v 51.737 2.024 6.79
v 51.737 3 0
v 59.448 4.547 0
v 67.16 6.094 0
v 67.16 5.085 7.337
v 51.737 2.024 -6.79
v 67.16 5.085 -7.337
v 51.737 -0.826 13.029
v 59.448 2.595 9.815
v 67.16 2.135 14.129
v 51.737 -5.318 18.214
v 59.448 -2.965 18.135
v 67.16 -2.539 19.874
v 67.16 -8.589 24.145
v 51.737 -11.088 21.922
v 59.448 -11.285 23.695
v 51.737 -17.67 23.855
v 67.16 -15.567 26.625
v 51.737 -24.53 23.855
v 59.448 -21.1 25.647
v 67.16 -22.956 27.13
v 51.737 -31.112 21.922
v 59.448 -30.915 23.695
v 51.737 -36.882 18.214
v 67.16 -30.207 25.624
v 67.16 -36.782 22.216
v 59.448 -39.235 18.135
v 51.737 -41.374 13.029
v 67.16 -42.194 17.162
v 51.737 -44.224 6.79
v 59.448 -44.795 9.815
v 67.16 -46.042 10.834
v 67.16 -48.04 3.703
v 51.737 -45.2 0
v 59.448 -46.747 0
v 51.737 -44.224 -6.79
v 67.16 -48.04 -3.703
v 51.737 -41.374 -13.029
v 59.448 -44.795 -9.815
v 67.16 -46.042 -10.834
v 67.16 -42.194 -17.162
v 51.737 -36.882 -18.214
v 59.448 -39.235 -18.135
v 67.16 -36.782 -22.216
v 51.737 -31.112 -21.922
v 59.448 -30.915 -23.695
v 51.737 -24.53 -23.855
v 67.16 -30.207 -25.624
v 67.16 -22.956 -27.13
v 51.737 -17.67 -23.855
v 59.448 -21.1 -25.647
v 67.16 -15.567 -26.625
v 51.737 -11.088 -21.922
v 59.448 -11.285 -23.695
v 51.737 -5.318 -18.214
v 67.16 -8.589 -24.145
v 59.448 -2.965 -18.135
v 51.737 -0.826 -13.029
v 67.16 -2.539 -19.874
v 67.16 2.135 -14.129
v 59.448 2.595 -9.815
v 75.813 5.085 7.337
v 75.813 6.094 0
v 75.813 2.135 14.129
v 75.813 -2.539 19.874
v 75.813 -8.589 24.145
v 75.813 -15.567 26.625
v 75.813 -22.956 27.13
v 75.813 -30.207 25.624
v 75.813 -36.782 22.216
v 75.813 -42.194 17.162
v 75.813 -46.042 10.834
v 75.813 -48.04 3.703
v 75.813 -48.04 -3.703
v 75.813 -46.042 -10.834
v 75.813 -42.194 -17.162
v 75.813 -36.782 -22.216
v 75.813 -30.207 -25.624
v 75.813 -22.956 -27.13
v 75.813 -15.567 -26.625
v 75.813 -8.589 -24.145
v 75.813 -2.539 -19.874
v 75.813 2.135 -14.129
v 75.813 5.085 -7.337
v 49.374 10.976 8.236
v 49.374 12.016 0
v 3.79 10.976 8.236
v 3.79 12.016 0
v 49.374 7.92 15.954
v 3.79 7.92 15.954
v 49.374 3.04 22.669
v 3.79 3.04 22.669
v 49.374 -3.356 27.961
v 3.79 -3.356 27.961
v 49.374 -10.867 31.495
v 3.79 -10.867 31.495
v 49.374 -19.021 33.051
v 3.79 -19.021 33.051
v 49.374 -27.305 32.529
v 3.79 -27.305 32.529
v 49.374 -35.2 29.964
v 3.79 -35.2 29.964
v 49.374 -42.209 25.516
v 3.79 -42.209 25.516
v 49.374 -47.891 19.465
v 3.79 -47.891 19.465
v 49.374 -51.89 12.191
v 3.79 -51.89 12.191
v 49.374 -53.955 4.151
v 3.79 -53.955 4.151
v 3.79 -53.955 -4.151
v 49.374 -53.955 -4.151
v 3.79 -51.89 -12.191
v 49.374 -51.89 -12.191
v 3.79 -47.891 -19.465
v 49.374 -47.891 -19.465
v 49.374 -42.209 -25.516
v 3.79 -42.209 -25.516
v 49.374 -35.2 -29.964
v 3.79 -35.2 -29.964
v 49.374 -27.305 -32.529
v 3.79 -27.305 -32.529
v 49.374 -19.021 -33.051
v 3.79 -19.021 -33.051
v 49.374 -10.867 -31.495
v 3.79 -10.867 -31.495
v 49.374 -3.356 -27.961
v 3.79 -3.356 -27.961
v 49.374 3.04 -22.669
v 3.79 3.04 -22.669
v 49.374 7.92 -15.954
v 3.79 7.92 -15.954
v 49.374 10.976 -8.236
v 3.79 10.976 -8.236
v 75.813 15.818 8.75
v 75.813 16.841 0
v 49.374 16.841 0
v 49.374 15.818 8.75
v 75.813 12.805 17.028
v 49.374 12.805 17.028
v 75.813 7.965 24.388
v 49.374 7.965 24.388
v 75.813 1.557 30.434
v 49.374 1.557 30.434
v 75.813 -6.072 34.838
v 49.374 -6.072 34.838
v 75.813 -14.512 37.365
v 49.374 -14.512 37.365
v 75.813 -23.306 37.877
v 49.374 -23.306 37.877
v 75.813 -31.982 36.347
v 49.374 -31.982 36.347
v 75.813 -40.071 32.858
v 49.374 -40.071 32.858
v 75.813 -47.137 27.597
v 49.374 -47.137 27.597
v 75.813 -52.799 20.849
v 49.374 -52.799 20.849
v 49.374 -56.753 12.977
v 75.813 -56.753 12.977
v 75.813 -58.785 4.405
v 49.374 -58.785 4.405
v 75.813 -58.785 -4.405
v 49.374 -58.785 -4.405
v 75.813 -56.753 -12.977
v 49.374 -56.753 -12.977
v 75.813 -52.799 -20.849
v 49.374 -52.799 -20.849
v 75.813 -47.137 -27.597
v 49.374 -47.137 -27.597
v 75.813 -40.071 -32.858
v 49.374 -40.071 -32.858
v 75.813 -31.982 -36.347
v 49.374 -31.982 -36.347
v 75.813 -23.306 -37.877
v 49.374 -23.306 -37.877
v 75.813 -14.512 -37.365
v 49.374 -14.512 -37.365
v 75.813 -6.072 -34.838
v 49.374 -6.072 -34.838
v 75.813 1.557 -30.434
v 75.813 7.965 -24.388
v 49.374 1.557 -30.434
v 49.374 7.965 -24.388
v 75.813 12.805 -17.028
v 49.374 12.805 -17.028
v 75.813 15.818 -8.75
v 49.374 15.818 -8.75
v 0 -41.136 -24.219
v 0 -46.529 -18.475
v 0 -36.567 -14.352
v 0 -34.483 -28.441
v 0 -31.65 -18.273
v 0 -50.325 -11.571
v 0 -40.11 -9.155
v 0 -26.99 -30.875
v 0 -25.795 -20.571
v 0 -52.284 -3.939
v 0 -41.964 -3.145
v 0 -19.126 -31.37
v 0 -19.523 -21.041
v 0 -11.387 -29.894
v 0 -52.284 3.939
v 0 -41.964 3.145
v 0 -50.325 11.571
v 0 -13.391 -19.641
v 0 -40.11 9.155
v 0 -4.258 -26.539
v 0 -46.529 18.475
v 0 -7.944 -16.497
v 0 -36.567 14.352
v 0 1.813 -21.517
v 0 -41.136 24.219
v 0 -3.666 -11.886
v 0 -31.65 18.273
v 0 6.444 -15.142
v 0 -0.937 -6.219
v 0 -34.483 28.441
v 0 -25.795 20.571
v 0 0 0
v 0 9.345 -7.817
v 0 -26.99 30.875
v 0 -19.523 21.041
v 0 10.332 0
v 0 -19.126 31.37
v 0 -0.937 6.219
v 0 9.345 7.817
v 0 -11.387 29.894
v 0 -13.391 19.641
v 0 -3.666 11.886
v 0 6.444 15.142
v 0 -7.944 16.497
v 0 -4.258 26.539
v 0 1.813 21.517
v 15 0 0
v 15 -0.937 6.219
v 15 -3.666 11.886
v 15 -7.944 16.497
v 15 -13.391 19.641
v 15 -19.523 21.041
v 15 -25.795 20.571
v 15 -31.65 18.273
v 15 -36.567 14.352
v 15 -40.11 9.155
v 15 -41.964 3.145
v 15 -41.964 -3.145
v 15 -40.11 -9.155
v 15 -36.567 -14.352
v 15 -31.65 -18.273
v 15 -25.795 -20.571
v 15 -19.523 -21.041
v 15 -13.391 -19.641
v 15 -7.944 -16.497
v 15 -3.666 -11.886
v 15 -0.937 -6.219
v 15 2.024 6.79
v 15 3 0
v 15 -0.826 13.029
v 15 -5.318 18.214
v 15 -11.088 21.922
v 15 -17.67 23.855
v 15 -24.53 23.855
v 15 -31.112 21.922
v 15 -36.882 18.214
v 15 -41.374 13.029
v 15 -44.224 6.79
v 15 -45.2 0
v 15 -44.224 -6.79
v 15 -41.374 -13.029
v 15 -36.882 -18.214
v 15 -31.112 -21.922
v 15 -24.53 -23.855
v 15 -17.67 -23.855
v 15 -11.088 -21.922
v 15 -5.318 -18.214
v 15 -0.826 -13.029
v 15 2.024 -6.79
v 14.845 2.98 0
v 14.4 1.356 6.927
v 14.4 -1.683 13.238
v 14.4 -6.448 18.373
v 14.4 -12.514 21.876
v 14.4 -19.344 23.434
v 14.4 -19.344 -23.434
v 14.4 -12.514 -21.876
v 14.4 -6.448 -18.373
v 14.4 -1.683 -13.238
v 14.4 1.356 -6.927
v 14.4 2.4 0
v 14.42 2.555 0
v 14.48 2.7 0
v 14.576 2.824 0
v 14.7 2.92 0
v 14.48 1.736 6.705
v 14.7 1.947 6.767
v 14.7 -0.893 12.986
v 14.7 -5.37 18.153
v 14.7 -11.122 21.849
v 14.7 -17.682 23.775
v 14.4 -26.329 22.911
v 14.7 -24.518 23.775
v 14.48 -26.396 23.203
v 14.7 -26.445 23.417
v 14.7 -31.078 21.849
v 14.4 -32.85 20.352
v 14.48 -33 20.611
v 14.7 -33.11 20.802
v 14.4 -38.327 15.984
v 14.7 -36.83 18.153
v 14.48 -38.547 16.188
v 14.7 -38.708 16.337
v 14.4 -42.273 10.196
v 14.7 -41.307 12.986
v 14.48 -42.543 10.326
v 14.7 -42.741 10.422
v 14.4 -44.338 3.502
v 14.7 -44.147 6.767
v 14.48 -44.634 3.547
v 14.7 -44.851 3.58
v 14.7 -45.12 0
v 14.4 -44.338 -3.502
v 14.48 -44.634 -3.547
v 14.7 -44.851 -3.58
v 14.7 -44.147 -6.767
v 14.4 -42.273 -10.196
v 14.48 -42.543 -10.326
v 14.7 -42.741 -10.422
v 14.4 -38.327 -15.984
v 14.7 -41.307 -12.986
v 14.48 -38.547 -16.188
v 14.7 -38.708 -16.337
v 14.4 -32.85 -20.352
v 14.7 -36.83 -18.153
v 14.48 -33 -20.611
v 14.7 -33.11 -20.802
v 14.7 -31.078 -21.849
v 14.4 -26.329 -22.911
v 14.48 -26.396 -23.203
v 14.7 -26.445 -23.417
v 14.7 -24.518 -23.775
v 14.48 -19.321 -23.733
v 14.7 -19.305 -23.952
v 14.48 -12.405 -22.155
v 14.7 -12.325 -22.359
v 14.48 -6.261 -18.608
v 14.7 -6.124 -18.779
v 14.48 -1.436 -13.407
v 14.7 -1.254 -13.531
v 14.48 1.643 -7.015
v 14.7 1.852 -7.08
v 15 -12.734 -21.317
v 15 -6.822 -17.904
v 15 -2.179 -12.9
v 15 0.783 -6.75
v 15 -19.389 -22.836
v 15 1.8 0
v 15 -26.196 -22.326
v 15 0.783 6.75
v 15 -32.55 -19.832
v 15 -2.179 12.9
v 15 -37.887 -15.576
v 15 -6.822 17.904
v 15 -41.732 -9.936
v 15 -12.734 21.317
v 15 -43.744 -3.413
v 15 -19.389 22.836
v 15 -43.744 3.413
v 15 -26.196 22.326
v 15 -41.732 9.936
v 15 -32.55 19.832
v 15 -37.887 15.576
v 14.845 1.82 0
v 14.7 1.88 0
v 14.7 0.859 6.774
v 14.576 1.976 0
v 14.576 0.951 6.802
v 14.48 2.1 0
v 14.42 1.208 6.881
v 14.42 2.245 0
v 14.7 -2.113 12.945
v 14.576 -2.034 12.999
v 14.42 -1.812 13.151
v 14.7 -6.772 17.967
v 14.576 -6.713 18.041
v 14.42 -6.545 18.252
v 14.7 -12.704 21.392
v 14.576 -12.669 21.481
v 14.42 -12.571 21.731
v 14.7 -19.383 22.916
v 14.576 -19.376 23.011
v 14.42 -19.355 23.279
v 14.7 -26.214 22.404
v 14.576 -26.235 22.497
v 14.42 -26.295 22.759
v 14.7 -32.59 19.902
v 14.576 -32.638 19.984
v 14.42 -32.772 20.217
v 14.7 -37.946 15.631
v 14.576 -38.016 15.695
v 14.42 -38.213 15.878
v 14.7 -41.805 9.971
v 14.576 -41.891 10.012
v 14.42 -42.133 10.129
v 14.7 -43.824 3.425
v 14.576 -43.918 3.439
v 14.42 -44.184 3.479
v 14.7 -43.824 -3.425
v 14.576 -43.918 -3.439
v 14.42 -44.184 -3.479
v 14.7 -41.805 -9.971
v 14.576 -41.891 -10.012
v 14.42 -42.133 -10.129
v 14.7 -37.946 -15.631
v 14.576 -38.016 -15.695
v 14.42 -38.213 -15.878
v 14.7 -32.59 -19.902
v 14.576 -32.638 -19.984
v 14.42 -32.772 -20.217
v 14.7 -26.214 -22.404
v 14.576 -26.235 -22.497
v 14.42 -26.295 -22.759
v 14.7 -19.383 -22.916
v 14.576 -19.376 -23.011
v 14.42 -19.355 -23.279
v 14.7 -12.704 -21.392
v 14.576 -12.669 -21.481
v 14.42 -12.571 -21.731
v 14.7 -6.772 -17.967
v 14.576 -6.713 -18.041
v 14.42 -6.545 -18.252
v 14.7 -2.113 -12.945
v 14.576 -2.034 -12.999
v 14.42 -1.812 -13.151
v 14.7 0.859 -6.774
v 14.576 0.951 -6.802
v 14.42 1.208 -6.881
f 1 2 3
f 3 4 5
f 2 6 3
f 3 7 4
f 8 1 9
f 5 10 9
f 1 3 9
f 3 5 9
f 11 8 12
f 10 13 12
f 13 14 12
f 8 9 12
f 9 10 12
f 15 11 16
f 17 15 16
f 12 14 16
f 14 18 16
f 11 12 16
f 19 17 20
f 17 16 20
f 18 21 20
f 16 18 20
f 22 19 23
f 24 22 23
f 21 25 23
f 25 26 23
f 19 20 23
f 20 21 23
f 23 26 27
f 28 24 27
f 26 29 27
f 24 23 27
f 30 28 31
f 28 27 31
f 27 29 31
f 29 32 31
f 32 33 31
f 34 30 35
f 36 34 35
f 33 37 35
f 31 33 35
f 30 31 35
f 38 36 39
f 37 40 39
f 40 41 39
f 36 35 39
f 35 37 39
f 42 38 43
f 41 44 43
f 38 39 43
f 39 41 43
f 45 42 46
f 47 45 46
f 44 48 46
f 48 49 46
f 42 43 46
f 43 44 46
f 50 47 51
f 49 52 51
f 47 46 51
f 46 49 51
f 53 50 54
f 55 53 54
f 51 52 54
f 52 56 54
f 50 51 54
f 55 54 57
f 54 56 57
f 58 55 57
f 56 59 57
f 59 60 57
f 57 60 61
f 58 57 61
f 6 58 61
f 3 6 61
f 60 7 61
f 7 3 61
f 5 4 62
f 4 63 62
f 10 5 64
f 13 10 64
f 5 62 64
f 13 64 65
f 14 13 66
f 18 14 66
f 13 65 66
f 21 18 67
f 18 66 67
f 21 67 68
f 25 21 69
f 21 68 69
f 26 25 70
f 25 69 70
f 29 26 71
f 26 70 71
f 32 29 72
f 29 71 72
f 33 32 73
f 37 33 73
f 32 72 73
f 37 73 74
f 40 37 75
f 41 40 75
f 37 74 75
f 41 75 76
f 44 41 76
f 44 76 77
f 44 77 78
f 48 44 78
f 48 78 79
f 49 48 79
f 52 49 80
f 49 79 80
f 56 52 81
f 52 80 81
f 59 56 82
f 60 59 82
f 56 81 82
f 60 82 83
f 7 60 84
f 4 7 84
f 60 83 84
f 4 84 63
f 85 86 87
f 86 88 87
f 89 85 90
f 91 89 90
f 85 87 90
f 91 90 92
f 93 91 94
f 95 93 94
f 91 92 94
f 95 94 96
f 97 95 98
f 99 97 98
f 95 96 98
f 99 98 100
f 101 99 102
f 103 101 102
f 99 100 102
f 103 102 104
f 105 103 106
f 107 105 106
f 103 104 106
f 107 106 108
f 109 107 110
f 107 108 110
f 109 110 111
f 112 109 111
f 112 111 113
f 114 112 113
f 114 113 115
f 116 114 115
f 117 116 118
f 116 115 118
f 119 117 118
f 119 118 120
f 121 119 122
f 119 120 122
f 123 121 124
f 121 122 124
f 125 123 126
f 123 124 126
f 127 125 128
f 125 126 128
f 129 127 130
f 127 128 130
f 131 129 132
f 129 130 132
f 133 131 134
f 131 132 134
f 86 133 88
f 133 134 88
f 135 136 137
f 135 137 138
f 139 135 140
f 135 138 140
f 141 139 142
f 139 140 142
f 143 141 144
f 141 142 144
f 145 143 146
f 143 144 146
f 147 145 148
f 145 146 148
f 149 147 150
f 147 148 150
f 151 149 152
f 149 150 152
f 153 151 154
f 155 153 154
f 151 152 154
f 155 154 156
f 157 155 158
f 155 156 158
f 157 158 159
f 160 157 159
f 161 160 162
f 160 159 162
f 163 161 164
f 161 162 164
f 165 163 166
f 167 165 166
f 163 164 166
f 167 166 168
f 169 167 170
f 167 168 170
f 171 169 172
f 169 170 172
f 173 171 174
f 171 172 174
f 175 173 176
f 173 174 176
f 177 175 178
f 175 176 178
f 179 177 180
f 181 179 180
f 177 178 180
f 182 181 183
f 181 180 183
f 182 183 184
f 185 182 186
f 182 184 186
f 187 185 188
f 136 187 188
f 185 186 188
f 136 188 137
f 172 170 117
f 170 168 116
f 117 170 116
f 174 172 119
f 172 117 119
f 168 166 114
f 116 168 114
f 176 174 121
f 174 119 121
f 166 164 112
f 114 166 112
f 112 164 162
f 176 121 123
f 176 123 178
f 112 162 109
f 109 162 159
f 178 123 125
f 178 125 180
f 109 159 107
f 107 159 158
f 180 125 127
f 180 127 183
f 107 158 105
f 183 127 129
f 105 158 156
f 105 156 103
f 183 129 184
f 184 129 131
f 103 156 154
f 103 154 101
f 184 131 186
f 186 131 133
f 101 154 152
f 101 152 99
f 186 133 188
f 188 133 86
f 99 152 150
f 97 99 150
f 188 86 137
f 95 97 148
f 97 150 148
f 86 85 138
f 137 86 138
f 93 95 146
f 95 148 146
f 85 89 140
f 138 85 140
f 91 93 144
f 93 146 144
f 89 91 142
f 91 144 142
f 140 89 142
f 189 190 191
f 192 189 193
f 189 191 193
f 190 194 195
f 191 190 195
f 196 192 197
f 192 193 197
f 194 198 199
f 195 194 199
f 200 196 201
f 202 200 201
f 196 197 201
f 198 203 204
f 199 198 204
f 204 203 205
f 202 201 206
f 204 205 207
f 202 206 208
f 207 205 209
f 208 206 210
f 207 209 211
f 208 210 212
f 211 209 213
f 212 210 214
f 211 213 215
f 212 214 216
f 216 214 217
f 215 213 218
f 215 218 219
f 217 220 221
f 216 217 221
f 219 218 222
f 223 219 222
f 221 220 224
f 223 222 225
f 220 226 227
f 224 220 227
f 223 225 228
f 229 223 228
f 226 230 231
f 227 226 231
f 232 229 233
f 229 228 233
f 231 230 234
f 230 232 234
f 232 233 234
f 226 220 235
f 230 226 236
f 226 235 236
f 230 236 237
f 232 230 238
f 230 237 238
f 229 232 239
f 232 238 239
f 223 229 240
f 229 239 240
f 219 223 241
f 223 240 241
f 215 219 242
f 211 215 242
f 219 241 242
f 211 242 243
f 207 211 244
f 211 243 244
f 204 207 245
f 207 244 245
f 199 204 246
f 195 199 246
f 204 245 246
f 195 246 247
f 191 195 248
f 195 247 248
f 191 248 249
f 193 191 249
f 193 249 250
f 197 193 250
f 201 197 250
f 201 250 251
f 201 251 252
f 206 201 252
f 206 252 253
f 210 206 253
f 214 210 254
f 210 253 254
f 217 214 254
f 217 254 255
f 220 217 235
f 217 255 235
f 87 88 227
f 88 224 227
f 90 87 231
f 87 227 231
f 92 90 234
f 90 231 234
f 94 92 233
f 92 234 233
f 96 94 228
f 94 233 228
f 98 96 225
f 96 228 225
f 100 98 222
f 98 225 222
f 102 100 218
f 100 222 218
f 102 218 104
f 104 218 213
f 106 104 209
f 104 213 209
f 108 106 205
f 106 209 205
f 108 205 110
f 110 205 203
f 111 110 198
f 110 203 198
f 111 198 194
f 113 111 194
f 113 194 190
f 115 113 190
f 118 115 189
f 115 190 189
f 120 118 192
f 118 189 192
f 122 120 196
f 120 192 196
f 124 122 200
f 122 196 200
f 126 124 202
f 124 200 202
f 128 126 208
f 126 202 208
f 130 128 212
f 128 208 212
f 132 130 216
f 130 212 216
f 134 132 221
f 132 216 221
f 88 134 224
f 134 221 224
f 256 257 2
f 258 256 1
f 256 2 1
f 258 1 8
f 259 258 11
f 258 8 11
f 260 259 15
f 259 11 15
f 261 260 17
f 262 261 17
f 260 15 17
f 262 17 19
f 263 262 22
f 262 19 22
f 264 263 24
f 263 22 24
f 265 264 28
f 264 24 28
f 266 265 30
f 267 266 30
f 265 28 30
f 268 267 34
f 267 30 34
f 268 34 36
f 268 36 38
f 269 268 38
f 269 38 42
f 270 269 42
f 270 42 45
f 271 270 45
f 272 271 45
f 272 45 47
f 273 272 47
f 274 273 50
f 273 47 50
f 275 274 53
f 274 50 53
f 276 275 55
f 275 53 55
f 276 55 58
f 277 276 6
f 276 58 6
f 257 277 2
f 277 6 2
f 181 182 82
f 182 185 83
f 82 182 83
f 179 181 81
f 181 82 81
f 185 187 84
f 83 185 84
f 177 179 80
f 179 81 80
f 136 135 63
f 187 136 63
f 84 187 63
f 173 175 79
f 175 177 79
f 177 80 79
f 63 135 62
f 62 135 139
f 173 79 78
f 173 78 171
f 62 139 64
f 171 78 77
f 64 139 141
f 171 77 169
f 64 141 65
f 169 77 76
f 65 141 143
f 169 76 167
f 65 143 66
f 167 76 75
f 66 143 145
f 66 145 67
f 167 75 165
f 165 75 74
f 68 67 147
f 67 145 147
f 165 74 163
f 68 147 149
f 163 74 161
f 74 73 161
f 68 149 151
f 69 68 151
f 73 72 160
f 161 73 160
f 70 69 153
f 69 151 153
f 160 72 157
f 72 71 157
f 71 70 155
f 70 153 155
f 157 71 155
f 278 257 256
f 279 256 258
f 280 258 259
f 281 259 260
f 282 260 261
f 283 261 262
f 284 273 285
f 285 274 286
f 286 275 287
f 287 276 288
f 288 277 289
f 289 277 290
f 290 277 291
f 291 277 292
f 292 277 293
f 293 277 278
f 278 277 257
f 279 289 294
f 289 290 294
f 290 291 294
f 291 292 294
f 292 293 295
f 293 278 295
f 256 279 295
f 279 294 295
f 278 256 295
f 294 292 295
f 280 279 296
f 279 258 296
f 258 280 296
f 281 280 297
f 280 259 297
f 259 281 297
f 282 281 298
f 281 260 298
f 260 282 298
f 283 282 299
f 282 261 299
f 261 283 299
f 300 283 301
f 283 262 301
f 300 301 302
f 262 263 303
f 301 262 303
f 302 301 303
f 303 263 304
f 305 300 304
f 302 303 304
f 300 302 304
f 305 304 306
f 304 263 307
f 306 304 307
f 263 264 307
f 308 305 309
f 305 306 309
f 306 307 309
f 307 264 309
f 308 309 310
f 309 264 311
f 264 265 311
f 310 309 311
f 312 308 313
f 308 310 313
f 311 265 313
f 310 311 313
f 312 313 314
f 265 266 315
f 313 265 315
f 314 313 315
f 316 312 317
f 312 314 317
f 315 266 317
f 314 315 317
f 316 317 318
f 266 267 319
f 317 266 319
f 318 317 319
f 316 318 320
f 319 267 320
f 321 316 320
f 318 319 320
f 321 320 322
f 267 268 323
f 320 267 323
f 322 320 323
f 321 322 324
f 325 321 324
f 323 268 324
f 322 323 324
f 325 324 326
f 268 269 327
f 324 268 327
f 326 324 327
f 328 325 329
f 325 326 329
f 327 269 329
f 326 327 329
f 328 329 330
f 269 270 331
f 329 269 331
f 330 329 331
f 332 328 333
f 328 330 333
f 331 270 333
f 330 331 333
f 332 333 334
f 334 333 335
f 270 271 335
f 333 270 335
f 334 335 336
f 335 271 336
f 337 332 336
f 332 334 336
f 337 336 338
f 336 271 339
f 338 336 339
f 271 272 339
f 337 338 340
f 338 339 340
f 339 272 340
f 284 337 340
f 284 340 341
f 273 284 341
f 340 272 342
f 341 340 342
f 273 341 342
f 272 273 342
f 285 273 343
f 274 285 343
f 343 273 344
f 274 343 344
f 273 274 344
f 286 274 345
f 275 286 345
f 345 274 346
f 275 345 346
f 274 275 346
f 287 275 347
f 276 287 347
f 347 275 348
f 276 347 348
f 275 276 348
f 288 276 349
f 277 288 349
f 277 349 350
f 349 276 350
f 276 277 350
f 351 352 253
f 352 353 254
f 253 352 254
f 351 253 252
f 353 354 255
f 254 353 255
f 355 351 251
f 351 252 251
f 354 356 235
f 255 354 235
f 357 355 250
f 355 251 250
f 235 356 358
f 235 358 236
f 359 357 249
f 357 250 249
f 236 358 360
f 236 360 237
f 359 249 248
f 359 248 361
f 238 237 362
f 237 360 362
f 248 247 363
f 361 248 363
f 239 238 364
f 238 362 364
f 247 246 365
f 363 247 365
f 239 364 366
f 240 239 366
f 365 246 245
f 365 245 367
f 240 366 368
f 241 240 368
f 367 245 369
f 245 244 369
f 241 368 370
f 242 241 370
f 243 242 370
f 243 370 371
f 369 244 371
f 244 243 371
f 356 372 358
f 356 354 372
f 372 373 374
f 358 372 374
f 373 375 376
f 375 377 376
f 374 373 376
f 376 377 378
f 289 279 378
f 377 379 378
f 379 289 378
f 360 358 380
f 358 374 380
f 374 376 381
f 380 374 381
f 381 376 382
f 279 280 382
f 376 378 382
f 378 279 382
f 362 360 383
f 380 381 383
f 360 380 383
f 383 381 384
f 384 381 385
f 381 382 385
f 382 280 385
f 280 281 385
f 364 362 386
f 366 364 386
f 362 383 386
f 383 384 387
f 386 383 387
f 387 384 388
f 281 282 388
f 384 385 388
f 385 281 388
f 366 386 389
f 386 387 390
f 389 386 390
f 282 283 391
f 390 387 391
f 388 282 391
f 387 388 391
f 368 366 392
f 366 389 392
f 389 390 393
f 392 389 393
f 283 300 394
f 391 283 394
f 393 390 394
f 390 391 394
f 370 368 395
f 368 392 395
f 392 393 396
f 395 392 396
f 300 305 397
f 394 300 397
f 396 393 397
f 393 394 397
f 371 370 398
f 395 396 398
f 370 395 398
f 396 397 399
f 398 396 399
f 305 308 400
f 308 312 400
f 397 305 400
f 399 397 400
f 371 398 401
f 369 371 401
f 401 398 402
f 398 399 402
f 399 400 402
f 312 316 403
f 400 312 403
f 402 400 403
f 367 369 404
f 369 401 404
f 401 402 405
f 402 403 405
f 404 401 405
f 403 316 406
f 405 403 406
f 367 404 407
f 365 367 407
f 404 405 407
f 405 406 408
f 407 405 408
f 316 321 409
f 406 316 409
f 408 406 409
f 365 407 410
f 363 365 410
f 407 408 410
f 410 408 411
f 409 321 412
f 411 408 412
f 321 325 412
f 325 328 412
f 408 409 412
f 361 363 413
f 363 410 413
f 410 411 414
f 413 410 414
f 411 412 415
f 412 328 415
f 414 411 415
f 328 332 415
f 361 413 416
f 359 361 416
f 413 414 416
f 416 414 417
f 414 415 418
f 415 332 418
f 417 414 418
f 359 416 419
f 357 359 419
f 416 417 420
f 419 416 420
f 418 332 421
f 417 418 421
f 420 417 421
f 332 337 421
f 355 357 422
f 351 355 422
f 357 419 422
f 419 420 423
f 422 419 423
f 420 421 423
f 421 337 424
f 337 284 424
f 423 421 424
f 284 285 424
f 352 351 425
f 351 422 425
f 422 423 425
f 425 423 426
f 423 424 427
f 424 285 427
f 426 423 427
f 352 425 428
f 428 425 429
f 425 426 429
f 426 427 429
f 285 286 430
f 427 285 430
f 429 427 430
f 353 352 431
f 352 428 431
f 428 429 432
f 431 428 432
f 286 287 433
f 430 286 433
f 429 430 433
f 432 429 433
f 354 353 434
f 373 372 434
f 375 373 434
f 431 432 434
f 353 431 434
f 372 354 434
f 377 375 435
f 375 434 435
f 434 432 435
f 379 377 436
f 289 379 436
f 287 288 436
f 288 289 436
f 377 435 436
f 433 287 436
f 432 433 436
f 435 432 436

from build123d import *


with BuildPart() as f1:
    # F0 (on Top) → F1 (revolve)
    with BuildSketch(Plane.XY):
        with BuildLine():
            Line((0, 10.332034), (0, 0))
            Line((0, 0), (15, 0))
            Line((15, 0), (15, 1.8))
            ThreePointArc((15, 1.8), (14.575736, 1.975736), (14.4, 2.4))
            ThreePointArc((14.4, 2.4), (14.575736, 2.824264), (15, 3))
            Line((15, 3), (51.737146, 3))
            Line((51.737146, 3), (67.159845, 6.093667))
            Line((67.159845, 6.093667), (75.813033, 6.093667))
            Line((75.813033, 6.093667), (75.813033, 16.841185))
            Line((75.813033, 16.841185), (49.37445, 16.841185))
            Line((49.37445, 16.841185), (49.37445, 12.015897))
            Line((49.37445, 12.015897), (3.78983, 12.015897))
            Line((3.78983, 12.015897), (0, 10.332034))
        make_face()
    revolve(axis=Axis((26.506836, -21.1, 0), (1, 0, 0)))


solid = f1.part
